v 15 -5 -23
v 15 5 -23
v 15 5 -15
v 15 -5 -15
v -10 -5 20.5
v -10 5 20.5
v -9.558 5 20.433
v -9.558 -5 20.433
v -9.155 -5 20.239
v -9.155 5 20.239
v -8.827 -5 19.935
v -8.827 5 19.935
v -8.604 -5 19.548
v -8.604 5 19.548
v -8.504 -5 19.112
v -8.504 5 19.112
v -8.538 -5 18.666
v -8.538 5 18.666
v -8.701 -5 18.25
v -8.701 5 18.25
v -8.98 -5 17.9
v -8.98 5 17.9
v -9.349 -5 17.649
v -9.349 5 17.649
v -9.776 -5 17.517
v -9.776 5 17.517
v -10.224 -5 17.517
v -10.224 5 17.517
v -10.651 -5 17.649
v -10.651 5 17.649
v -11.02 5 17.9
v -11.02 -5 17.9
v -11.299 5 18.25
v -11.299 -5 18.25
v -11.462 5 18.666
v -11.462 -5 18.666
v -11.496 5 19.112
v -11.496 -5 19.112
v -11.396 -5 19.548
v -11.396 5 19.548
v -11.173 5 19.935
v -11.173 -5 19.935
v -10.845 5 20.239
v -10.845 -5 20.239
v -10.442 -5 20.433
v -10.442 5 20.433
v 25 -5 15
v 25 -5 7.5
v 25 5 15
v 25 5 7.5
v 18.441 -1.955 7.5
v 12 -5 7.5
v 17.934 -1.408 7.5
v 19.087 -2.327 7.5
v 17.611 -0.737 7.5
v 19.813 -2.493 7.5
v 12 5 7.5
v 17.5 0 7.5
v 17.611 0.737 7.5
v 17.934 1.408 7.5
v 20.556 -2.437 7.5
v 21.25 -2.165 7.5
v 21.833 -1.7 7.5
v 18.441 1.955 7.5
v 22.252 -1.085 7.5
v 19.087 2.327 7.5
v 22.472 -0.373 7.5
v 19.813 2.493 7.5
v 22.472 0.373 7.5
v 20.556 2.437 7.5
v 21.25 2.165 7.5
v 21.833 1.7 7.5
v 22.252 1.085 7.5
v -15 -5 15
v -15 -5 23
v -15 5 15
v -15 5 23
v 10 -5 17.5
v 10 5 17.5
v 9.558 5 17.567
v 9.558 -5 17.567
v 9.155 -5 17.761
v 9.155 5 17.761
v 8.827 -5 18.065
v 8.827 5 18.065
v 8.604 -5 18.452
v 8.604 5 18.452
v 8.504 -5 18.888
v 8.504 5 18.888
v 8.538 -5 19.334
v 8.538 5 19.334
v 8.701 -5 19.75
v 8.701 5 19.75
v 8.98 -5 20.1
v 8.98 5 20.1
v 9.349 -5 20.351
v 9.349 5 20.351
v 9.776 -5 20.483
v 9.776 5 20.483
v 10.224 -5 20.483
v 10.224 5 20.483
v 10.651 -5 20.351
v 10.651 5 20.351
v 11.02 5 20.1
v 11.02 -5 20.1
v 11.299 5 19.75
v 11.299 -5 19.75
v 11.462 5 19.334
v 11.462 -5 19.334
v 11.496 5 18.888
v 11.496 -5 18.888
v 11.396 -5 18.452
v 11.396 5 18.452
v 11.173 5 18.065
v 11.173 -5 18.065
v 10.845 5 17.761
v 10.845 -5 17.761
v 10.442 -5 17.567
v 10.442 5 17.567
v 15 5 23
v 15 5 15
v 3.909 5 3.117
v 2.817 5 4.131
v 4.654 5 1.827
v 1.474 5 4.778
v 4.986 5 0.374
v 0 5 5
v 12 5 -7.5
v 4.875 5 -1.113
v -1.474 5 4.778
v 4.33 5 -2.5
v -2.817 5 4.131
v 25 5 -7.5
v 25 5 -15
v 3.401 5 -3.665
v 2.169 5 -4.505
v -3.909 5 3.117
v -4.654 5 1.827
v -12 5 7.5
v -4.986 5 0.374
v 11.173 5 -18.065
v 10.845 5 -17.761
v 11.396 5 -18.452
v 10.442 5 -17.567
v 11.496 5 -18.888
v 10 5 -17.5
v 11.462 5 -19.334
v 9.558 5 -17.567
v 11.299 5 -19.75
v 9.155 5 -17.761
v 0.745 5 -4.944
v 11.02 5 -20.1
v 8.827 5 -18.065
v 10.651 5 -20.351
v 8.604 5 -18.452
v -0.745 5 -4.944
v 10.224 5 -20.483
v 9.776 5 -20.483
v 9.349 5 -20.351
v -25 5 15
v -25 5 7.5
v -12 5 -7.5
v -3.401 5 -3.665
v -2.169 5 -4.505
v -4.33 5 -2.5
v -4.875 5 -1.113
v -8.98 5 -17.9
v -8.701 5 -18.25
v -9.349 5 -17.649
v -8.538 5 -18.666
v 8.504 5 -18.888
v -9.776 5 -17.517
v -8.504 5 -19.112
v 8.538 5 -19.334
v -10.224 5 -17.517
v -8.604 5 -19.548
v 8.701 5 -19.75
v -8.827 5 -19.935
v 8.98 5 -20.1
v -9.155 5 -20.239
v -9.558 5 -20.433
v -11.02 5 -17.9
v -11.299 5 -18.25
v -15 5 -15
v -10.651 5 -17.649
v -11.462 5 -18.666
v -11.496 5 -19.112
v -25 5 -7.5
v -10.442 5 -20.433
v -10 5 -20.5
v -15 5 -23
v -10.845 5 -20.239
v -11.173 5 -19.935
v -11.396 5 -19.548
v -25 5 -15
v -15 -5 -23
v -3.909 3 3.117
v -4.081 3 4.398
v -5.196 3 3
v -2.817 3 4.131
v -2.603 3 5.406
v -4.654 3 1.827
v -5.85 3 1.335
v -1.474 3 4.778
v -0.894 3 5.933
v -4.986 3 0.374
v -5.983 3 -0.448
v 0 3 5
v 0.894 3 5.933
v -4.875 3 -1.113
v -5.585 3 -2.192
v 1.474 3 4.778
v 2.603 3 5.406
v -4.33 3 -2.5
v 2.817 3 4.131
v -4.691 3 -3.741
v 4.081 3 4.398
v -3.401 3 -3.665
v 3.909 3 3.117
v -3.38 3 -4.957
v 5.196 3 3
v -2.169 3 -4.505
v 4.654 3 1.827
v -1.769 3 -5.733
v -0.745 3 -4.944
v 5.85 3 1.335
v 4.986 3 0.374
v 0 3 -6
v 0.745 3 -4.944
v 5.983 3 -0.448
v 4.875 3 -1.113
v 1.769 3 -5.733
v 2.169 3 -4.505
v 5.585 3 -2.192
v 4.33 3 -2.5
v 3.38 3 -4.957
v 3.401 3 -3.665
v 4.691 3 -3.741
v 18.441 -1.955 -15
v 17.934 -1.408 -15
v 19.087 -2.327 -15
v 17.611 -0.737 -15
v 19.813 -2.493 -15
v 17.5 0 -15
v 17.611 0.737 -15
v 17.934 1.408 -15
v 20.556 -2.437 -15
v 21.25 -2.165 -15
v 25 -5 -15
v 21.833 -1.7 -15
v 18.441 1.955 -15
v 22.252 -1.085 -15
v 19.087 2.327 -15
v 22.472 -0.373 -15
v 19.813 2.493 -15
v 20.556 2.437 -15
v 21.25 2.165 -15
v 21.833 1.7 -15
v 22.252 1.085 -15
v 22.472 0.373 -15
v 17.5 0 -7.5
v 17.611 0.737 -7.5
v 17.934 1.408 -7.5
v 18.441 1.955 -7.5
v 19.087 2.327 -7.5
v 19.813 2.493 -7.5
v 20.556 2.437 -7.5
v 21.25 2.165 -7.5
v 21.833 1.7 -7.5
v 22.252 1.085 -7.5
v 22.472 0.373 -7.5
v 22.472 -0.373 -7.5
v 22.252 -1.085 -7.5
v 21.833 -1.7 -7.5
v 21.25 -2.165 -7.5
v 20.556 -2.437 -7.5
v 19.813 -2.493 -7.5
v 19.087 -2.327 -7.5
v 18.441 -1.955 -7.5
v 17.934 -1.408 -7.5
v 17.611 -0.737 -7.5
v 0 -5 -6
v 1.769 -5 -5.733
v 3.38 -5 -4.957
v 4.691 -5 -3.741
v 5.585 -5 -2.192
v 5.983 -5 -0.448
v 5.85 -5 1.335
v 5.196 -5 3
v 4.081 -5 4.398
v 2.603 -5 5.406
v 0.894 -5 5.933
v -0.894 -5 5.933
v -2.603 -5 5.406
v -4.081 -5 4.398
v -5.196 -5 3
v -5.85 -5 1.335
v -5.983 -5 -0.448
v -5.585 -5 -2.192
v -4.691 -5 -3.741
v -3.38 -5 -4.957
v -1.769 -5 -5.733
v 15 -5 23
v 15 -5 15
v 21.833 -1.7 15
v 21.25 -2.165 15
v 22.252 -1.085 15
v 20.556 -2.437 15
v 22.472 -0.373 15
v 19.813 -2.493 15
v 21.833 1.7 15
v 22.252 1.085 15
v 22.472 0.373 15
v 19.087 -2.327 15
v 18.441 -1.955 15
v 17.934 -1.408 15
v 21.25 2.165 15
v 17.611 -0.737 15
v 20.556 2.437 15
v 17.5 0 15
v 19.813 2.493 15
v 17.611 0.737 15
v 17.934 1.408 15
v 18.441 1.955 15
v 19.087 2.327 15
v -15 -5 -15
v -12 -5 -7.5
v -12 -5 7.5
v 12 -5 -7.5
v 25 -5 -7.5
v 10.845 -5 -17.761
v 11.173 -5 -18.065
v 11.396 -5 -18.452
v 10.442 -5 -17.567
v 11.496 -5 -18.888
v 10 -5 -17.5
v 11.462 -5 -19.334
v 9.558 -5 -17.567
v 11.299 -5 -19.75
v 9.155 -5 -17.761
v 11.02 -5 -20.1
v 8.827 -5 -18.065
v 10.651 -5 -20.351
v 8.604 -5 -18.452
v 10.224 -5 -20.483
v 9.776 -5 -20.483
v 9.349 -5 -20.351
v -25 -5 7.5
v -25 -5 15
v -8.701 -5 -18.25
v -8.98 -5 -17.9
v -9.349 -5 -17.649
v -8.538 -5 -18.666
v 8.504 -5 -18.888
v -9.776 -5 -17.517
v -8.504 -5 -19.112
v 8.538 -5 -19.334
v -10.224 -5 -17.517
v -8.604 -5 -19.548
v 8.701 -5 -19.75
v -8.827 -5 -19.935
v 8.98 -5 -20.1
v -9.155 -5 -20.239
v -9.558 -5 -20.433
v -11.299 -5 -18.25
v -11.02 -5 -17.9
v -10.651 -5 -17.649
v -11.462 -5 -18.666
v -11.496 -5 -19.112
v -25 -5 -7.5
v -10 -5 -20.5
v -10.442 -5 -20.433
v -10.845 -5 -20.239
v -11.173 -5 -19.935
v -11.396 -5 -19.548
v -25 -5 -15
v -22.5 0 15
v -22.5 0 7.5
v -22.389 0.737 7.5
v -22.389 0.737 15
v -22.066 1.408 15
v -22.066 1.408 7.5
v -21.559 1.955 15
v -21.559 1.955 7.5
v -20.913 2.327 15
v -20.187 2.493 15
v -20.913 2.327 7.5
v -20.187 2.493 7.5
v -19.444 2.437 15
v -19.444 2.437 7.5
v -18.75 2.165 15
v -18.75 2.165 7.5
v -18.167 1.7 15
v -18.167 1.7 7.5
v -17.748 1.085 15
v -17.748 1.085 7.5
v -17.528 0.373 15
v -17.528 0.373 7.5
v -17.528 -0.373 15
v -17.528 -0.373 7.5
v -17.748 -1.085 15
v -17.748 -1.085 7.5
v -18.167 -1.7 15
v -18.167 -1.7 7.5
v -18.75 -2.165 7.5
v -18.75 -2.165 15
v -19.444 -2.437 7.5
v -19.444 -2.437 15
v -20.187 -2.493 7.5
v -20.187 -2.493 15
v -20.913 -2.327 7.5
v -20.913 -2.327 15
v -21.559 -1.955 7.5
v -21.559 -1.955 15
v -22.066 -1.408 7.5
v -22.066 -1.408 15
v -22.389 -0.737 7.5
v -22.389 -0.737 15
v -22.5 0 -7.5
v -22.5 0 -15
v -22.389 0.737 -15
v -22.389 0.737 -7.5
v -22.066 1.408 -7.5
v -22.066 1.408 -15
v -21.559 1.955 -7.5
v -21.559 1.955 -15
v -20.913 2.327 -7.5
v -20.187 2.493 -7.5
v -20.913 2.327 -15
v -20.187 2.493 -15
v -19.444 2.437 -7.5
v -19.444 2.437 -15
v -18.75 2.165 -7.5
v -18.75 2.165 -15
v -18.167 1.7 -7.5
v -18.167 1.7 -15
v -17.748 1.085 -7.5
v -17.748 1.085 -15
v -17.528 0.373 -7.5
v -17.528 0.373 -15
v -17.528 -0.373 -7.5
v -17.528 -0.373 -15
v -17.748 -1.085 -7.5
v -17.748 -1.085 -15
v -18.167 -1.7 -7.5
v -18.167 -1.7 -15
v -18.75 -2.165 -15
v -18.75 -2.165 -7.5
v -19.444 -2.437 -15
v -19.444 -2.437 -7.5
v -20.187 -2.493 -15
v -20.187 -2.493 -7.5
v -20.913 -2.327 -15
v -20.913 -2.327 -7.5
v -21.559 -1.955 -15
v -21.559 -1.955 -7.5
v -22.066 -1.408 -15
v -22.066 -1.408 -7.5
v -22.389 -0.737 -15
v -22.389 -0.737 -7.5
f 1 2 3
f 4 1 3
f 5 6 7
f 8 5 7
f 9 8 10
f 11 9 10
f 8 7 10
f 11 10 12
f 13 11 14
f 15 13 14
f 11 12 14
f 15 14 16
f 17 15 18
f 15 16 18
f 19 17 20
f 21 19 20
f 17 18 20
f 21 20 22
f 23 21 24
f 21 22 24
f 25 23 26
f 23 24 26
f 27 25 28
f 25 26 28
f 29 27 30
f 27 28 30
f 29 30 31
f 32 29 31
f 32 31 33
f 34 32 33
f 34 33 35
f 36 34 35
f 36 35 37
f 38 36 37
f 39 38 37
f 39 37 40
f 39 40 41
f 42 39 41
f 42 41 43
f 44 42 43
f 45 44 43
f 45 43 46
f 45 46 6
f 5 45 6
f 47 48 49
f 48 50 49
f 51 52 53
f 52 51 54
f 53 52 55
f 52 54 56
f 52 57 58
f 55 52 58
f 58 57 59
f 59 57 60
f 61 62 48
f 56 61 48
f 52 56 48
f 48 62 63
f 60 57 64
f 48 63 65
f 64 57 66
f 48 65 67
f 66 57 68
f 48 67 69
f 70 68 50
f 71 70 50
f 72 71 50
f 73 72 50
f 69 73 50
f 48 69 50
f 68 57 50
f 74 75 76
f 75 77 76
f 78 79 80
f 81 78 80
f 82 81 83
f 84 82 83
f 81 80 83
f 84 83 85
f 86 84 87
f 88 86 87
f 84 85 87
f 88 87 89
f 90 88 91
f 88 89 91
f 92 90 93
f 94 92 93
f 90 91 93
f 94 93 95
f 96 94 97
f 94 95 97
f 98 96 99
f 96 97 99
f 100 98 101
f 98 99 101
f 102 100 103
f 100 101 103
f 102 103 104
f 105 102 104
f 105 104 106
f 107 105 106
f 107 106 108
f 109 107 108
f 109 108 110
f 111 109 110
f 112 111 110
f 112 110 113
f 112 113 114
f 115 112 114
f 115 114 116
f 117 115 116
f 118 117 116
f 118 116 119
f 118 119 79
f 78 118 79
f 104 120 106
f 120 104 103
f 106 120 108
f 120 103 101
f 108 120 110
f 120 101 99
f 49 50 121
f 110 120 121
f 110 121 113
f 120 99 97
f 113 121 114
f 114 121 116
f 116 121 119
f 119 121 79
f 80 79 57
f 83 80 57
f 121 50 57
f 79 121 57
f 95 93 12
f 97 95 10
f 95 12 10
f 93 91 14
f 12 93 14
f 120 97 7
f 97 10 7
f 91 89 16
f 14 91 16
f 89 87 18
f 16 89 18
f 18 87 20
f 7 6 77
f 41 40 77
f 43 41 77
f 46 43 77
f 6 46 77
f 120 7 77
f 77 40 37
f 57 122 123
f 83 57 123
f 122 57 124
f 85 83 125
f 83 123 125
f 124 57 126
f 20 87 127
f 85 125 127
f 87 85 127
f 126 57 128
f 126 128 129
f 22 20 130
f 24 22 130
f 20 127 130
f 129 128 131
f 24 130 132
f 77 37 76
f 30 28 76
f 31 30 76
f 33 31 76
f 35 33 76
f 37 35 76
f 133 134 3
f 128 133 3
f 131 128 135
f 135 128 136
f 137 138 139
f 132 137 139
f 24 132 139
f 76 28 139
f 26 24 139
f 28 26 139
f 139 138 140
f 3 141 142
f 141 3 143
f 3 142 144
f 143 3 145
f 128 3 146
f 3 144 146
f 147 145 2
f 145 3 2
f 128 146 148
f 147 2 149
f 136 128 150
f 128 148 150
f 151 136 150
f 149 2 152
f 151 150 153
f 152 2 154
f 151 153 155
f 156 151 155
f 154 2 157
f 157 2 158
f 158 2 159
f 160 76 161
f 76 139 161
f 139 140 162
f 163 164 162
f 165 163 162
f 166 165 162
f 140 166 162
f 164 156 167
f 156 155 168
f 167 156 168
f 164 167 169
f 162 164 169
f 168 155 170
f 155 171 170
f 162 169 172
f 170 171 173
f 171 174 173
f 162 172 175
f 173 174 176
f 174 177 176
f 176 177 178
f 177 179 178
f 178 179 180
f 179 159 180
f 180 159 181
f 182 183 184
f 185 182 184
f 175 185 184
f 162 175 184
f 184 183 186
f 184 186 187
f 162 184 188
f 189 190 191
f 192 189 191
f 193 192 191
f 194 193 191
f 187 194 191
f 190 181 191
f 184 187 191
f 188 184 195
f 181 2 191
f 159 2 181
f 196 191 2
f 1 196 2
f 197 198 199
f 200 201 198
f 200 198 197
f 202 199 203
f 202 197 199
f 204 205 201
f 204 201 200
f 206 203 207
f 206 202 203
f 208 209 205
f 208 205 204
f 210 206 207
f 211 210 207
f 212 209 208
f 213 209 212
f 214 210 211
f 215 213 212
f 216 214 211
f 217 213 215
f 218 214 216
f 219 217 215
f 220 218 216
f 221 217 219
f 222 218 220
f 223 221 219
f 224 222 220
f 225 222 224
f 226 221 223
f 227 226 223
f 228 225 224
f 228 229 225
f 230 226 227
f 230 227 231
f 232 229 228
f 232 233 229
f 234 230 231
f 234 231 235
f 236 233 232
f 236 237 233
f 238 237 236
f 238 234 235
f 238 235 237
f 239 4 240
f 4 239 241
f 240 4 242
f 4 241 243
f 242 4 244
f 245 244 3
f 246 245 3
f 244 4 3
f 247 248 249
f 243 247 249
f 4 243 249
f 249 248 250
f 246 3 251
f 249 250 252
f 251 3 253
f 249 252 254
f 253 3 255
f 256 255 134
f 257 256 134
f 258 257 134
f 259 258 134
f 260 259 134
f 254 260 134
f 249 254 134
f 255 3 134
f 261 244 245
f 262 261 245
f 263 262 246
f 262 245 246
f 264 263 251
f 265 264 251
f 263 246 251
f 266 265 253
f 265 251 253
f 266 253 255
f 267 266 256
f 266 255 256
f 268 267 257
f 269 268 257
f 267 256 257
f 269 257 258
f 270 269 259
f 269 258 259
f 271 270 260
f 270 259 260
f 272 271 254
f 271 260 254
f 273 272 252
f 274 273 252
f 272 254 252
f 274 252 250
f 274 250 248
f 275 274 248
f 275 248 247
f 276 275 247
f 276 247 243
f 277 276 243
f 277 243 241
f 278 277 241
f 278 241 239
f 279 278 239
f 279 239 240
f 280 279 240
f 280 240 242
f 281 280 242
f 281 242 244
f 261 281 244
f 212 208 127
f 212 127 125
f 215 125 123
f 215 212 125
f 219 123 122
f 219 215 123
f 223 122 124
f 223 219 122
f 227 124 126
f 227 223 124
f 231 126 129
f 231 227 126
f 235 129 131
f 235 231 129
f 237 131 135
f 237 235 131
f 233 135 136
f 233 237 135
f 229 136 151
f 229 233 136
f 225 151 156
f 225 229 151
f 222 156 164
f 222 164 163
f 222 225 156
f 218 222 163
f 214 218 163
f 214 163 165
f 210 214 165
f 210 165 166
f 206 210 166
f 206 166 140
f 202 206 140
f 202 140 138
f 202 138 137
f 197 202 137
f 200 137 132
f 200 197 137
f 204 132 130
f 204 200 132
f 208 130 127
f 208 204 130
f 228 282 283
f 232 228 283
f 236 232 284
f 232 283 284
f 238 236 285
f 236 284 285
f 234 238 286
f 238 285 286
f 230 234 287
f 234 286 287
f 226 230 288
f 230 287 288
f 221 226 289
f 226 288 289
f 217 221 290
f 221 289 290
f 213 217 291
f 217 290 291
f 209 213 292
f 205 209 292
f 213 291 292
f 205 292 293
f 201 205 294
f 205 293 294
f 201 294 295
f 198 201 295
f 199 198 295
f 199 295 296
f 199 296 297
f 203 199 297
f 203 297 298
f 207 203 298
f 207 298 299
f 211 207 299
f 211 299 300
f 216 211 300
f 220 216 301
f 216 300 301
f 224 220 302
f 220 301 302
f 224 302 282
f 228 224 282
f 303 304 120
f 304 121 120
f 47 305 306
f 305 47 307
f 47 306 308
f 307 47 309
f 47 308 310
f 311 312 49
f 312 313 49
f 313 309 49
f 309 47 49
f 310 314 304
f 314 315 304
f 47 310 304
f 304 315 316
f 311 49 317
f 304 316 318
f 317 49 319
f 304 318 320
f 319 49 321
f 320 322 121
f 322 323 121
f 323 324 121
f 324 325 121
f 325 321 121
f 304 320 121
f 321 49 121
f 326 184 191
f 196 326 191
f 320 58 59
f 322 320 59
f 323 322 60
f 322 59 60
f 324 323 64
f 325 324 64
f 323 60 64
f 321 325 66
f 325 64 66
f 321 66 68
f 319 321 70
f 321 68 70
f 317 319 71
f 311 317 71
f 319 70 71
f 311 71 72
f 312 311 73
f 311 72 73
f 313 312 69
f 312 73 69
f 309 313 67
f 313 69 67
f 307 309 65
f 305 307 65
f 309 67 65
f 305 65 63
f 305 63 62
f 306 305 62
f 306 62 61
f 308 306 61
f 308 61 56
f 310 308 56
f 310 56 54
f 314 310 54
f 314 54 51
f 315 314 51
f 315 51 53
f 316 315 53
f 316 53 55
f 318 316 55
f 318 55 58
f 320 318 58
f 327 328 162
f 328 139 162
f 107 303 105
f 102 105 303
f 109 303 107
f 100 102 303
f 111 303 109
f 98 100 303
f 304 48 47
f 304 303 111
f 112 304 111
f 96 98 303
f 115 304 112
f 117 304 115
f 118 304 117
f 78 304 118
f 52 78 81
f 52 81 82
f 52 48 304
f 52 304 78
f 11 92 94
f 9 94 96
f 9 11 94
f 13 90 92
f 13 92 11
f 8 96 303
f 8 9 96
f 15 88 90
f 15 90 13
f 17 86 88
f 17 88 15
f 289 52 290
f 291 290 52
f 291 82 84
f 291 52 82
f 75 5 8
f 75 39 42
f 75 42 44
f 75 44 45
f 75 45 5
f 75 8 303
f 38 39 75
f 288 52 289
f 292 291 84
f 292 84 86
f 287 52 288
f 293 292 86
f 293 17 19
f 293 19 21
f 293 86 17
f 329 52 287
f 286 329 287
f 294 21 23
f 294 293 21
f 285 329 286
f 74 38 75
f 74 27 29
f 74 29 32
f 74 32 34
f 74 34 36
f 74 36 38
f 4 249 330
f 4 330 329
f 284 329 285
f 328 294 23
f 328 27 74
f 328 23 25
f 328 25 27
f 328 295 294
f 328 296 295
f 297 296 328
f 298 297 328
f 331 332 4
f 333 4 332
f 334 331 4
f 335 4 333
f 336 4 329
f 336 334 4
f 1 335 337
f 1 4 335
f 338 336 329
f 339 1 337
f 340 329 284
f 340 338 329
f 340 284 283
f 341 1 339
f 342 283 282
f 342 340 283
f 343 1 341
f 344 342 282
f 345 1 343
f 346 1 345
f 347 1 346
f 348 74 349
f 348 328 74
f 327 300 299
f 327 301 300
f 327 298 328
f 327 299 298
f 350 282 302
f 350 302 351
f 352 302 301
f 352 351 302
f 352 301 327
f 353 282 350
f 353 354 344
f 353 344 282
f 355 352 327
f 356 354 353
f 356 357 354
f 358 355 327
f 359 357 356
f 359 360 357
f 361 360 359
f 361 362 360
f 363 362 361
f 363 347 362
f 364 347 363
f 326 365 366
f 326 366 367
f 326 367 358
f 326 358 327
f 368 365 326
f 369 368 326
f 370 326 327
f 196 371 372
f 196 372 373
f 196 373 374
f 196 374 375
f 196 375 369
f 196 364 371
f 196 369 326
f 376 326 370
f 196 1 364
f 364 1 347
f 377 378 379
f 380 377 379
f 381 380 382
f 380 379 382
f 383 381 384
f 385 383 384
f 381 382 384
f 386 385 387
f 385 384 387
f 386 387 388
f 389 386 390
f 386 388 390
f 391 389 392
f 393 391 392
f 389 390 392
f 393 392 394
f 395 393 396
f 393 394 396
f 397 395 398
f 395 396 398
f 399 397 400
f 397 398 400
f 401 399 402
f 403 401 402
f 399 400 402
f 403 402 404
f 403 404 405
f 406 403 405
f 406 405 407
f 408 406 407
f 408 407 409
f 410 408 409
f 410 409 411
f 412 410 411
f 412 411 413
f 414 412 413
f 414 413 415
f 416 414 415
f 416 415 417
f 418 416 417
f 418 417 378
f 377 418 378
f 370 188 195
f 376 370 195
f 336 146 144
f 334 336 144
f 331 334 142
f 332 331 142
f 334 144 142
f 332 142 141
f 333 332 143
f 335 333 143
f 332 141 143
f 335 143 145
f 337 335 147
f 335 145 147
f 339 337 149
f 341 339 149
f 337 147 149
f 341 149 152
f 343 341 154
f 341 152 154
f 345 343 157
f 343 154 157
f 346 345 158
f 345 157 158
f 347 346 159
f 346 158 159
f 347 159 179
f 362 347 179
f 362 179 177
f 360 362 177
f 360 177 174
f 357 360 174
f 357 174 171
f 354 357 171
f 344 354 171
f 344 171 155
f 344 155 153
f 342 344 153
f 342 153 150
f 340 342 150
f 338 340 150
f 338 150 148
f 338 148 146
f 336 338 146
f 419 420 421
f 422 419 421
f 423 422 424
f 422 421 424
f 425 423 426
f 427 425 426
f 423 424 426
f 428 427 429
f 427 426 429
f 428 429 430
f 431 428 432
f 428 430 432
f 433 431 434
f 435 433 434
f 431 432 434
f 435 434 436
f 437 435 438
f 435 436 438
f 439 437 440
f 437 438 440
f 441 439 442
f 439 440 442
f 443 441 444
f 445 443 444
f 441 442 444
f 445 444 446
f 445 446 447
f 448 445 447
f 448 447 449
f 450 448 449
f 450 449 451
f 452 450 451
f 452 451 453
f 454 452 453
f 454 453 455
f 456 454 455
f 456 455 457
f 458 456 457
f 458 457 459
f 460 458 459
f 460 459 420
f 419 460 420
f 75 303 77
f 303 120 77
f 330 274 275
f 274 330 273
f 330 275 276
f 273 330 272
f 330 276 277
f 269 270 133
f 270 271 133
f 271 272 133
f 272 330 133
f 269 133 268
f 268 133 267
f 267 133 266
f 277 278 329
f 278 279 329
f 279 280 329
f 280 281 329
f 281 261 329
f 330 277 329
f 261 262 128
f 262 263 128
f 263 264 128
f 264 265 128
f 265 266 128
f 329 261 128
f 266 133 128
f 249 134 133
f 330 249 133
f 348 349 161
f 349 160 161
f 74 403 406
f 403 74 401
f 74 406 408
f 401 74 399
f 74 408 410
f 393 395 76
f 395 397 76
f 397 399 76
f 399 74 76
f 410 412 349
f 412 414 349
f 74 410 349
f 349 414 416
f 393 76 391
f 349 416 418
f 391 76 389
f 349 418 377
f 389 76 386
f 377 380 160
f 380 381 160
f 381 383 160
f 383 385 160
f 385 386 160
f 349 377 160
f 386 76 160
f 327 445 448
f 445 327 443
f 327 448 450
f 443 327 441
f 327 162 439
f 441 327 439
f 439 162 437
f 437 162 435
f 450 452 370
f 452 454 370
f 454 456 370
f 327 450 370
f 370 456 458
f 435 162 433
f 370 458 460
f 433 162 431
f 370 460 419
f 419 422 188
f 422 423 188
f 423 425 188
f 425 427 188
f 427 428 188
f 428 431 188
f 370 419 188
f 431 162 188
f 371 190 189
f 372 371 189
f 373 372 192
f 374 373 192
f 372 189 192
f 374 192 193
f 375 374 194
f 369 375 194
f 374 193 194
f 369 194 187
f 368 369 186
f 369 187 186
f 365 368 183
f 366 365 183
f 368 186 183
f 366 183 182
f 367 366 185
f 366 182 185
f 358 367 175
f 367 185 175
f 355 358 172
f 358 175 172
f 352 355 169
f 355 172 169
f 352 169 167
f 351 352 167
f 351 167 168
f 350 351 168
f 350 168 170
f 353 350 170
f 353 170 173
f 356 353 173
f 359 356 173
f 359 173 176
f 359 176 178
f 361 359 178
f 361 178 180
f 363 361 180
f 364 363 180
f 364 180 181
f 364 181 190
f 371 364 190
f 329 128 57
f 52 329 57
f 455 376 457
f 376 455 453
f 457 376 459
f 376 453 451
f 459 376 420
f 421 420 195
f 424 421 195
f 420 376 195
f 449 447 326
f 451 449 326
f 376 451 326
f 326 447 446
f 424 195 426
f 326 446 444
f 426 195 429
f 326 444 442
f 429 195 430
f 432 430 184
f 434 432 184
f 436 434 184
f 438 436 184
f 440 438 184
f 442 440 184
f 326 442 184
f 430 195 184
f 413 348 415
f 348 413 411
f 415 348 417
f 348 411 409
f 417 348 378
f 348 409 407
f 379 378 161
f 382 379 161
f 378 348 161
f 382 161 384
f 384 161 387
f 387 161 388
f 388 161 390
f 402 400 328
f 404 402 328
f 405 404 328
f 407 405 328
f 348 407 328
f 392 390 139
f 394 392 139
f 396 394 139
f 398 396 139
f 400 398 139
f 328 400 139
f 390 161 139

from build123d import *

# Parameters (mm, degrees)
SKETCH9_R           = 5
BOSS_EXTRUDE5_DEPTH = 5
SKETCH10_R          = 2.5
CUT_EXTRUDE5_DEPTH  = 46.760244755
SKETCH11_R          = 6
CUT_EXTRUDE6_DEPTH  = 8
SKETCH12_R          = 1.5
CUT_EXTRUDE7_DEPTH  = 36.411862419


with BuildPart() as part:
    # Sketch9 → Boss-Extrude5 (new, symmetric)
    with BuildSketch(Plane(origin=(0, 0, 0), x_dir=(1, 0, 0), z_dir=(0, 1, 0))):
        Polygon((12, 7.5), (12, -7.5), (25, -7.5), (25, -15), (15, -15), (15, -23), (-15, -23), (-15, -15), (-25, -15), (-25, -7.5), (-12, -7.5), (-12, 7.5), (-25, 7.5), (-25, 15), (-15, 15), (-15, 23), (15, 23), (15, 15), (25, 15), (25, 7.5), align=None)
        with Locations(Location((0, 0, 0), (0, 0, 270))):
            Circle(SKETCH9_R, mode=Mode.SUBTRACT)
    extrude(amount=BOSS_EXTRUDE5_DEPTH, both=True)

    # Sketch10 → Cut-Extrude5 (cut, through all)
    with BuildSketch(Plane(origin=(0, 0, -15), x_dir=(-1, 0, 0), z_dir=(0, 0, -1))):
        with Locations((20, 0)):
            Circle(SKETCH10_R)
        with Locations((-20, 0)):
            Circle(SKETCH10_R)
    extrude(amount=-CUT_EXTRUDE5_DEPTH, mode=Mode.SUBTRACT)

    # Sketch11 → Cut-Extrude6 (cut)
    with BuildSketch(Plane.XZ.offset(5)):
        with Locations(Location((0, 0, 0), (0, 0, 270))):
            Circle(SKETCH11_R)
    extrude(amount=-CUT_EXTRUDE6_DEPTH, mode=Mode.SUBTRACT)

    # Sketch12 → Cut-Extrude7 (cut, through all)
    with BuildSketch(Plane(origin=(0, 5, 0), x_dir=(1, 0, 0), z_dir=(0, 1, 0))):
        with Locations(Location((10, 19, 0), (0, 0, 270))):
            Circle(SKETCH12_R)
        with Locations(Location((-10, 19, 0), (0, 0, 90))):
            Circle(SKETCH12_R)
        with Locations(Location((10, -19, 0), (0, 0, 90))):
            Circle(SKETCH12_R)
        with Locations(Location((-10, -19, 0), (0, 0, 270))):
            Circle(SKETCH12_R)
    extrude(amount=-CUT_EXTRUDE7_DEPTH, mode=Mode.SUBTRACT)


solid = part.part
